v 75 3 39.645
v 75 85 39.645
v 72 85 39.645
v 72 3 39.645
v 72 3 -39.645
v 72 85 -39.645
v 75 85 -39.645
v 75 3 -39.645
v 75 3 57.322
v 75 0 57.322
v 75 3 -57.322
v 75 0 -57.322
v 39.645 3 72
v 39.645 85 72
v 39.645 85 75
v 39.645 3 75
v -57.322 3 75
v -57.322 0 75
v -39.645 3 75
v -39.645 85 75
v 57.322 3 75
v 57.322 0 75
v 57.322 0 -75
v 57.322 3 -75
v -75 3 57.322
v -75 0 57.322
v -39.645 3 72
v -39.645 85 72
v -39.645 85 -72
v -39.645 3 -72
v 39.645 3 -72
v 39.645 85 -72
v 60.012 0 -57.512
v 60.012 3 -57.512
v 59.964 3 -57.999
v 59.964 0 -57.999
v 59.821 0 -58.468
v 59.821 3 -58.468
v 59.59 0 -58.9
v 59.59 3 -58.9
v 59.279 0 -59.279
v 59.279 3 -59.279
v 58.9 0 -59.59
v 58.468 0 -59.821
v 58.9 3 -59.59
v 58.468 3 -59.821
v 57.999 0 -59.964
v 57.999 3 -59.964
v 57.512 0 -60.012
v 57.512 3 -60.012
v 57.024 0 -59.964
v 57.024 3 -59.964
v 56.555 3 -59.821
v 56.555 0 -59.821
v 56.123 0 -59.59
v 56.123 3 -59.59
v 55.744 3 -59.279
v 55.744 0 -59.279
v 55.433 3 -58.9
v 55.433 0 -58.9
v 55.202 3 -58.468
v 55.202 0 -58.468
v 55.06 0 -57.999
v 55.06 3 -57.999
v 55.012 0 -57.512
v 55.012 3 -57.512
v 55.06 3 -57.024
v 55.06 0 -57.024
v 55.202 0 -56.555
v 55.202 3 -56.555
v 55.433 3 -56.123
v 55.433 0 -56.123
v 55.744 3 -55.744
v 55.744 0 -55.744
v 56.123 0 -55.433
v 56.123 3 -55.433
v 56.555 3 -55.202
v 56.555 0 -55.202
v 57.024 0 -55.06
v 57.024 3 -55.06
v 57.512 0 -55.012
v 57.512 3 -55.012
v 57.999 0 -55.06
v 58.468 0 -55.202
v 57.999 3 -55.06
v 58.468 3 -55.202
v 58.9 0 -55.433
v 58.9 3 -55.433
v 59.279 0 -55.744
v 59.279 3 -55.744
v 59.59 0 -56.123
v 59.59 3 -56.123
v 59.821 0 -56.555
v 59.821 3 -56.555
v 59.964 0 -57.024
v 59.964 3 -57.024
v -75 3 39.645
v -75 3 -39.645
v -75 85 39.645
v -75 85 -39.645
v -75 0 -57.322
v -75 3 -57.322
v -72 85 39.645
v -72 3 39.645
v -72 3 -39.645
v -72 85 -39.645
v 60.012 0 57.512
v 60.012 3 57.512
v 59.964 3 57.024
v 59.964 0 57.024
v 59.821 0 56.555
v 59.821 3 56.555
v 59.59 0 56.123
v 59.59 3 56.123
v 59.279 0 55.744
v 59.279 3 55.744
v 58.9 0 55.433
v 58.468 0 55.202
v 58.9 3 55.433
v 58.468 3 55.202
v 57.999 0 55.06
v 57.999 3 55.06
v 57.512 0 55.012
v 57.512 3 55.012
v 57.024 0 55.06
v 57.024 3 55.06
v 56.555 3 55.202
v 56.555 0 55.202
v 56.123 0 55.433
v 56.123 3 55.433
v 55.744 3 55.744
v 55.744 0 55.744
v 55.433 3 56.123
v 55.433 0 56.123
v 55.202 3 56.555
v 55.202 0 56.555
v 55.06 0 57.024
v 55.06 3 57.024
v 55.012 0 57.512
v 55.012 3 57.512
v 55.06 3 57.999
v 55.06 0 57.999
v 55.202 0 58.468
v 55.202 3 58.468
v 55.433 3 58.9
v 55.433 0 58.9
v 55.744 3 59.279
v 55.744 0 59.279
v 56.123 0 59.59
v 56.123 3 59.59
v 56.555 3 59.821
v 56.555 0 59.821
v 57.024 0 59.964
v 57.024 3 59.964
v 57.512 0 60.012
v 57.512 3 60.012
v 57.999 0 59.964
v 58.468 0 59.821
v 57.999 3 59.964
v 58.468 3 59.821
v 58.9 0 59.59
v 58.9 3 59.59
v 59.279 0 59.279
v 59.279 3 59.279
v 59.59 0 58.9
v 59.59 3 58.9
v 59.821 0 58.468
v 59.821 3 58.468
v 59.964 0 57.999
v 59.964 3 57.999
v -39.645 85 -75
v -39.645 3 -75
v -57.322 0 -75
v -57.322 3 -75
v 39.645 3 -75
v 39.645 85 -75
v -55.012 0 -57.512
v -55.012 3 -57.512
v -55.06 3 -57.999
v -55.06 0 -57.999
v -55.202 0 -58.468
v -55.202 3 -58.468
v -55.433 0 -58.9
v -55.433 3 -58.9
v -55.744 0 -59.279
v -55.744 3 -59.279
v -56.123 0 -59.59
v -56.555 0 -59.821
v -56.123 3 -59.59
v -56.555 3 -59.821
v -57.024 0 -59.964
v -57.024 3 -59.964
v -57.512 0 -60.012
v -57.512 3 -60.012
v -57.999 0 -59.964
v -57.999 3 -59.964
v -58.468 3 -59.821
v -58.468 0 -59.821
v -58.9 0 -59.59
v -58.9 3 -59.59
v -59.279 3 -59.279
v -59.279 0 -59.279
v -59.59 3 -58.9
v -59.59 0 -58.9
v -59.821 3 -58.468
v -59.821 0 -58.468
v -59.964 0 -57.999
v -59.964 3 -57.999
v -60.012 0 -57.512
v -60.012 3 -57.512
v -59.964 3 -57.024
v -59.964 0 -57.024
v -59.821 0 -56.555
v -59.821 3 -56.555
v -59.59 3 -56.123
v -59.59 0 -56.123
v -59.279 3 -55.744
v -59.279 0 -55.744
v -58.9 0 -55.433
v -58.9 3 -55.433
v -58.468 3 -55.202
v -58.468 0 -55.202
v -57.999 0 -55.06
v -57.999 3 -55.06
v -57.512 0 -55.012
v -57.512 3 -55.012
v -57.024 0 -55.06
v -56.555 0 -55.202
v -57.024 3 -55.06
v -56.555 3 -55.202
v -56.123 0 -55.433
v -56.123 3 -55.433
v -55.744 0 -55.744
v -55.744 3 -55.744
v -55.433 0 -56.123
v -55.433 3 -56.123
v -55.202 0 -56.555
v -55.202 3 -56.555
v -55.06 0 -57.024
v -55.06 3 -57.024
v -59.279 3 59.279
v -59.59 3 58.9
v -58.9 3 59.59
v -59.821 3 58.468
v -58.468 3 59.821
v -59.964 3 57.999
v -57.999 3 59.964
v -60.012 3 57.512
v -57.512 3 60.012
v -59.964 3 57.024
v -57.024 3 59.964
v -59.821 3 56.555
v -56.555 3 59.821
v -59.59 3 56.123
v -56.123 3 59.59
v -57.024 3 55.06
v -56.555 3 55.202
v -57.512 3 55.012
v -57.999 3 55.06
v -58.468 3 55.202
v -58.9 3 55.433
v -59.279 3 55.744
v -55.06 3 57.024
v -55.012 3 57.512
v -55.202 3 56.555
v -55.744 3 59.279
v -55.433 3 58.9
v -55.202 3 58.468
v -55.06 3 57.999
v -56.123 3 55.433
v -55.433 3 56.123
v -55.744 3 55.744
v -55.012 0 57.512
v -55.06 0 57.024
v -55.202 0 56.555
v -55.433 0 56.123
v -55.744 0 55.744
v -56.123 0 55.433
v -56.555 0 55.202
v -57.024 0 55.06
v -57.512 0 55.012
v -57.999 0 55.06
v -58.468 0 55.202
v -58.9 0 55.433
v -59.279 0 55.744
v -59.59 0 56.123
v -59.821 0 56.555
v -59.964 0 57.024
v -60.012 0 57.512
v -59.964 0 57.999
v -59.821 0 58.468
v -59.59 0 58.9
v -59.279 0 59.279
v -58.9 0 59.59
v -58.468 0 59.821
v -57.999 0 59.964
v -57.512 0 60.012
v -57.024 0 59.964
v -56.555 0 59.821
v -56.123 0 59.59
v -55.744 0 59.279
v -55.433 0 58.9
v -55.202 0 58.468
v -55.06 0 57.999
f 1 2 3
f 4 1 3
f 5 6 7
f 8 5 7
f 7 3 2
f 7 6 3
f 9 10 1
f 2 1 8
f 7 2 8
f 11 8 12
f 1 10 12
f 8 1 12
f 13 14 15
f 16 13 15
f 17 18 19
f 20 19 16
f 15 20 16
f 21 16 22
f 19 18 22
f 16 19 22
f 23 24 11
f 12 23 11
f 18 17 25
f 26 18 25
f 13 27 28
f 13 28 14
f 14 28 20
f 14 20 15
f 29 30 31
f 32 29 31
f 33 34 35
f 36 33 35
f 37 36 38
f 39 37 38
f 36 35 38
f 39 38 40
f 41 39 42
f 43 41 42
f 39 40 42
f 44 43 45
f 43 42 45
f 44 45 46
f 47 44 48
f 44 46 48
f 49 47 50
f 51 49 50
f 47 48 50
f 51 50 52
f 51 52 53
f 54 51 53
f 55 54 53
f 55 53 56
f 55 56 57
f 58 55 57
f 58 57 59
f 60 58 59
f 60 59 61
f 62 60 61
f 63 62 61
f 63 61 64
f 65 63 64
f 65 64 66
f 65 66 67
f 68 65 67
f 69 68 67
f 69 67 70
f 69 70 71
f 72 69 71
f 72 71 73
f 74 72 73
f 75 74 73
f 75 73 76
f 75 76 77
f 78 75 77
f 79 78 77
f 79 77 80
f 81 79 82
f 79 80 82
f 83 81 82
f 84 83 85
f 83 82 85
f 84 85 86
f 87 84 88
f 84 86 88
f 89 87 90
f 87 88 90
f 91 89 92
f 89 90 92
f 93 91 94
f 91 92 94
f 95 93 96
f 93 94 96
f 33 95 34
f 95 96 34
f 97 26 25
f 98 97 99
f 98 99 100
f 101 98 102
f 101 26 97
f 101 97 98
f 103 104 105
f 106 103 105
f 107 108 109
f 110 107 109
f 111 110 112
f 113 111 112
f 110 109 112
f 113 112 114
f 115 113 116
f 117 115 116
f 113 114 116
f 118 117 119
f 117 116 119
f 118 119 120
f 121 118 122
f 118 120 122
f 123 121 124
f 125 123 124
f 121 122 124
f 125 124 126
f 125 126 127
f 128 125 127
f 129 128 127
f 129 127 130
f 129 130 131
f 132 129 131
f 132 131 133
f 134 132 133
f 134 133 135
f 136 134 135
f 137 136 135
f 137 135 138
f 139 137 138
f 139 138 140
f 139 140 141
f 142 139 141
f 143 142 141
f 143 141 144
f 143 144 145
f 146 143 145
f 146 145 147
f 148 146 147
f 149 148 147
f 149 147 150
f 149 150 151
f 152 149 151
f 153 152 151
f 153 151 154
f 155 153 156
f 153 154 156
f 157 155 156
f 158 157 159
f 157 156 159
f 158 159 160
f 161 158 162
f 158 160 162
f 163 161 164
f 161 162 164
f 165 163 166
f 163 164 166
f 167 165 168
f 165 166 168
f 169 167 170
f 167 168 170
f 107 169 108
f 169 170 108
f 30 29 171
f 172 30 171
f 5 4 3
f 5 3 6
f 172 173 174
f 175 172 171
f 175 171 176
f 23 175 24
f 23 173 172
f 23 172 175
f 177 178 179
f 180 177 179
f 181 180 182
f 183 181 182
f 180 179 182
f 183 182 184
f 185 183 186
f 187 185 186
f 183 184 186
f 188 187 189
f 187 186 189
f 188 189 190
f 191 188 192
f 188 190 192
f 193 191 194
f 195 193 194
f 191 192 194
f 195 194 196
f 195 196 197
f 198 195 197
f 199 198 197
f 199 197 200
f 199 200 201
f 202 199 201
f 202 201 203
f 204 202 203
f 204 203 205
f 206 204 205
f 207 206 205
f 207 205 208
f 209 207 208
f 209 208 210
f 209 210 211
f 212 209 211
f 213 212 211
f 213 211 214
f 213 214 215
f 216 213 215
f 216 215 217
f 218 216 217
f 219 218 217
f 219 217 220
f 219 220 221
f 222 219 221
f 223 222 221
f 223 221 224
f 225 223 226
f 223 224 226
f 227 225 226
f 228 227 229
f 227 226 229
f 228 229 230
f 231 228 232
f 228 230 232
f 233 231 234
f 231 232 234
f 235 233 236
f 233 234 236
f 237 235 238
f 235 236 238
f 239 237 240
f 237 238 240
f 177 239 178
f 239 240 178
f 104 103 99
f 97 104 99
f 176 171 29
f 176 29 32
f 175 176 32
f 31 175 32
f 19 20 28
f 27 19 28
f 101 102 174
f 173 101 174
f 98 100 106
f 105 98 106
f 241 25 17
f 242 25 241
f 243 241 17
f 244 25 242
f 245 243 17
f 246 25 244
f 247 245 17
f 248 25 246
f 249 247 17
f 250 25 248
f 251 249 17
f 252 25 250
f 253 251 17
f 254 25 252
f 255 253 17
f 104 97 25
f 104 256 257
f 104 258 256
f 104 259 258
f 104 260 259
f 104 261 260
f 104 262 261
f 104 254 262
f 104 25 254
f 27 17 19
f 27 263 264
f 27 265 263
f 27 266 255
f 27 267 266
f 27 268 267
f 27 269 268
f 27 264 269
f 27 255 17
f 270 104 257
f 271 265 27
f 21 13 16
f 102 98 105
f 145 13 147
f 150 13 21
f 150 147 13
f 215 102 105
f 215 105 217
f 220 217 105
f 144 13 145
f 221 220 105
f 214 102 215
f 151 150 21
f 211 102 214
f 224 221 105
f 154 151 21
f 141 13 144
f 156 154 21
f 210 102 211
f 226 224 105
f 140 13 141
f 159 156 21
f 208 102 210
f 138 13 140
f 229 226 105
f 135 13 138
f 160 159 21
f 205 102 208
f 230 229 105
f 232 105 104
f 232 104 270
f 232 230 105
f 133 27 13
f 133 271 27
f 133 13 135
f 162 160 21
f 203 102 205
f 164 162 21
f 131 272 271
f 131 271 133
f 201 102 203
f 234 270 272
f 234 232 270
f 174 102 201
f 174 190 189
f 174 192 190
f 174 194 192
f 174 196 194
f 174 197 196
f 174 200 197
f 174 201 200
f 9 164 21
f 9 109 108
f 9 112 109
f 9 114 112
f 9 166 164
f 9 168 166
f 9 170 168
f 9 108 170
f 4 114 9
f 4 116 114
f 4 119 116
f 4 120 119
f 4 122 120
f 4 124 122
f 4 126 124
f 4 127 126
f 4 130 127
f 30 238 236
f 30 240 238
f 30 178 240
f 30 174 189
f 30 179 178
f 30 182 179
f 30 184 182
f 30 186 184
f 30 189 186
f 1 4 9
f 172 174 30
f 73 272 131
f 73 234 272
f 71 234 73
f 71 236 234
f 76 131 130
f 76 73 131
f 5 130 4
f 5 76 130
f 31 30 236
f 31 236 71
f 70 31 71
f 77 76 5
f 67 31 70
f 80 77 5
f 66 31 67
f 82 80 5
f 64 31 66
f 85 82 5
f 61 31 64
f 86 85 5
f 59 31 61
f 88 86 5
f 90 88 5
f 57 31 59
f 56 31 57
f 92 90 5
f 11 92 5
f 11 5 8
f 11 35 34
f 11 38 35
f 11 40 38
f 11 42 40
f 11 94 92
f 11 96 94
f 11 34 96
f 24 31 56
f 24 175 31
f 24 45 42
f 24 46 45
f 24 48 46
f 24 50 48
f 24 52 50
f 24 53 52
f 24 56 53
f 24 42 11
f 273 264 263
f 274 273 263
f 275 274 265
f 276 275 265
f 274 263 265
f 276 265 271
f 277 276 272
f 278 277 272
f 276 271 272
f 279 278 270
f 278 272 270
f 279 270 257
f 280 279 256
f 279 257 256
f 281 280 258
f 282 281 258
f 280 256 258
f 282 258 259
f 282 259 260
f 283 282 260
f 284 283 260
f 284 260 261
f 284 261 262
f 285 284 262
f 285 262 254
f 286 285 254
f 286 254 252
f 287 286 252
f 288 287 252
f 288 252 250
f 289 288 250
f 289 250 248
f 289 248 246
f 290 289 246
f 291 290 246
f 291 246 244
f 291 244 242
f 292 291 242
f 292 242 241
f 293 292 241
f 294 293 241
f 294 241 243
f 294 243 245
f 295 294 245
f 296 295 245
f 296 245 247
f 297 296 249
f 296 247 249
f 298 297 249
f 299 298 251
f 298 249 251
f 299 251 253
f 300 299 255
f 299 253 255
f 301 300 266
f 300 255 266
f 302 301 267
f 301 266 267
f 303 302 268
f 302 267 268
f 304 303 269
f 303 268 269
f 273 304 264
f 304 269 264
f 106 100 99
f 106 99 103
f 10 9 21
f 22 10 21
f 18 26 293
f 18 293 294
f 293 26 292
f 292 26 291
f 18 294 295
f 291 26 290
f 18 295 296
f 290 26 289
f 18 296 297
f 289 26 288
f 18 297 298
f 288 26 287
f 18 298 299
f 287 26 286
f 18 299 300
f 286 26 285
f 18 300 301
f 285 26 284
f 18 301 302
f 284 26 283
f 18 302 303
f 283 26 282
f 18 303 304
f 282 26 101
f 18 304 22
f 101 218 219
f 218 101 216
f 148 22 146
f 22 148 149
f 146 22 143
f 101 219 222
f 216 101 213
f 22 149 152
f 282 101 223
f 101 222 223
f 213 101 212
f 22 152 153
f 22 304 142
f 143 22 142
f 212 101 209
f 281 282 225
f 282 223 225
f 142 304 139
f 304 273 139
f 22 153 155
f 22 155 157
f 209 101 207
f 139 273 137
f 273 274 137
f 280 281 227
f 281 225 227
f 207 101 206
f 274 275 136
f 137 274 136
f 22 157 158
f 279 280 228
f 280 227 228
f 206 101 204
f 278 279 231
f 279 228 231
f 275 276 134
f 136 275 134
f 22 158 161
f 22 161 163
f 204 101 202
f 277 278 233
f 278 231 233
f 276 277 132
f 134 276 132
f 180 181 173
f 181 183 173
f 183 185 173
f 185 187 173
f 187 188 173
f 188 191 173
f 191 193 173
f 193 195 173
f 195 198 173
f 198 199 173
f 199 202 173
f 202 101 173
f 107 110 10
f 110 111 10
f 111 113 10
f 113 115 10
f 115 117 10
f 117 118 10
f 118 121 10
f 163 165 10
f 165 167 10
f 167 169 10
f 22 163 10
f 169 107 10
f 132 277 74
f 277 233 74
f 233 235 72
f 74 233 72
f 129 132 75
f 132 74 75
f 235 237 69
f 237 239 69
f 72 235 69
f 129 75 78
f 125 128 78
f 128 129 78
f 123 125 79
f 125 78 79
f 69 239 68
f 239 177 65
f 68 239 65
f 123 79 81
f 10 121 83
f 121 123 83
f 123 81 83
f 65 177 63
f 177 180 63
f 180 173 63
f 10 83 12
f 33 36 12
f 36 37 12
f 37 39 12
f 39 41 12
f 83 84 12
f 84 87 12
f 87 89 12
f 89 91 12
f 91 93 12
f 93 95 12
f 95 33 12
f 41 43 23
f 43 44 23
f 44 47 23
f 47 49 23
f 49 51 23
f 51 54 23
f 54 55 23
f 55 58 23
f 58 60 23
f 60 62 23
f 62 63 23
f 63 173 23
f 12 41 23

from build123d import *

# Parameters (mm, degrees)
SKETCH2_W           = 150
SKETCH2_H           = 150
BOSS_EXTRUDE1_DEPTH = 85
SHELL1_T            = -3
CUT_EXTRUDE1_DEPTH  = 82
CUT_EXTRUDE2_DEPTH  = 4
SKETCH5_R           = 2.5
CUT_EXTRUDE3_DEPTH  = 4


with BuildPart() as part:
    # Sketch2 → Boss-Extrude1 (new body)
    with BuildSketch(Plane(origin=(0, 0, 0), x_dir=(1, 0, 0), z_dir=(0, 1, 0))):
        Rectangle(SKETCH2_W, SKETCH2_H)
    extrude(amount=BOSS_EXTRUDE1_DEPTH)

    # Shell1
    shell1_openings = [part.faces().sort_by_distance(p)[0] for p in [
        (0, 85, 0),
    ]]
    offset(amount=SHELL1_T, openings=shell1_openings, kind=Kind.INTERSECTION)

    # Sketch3 → Cut-Extrude1 (cut)
    with BuildSketch(Plane(origin=(0, 85, 0), x_dir=(1, 0, 0), z_dir=(0, 1, 0))):
        Polygon((39.644660941, -75), (75, -75), (75, -39.644660941), (72, -39.644660941), (72, -42.644660941), (72, -72), (39.644660941, -72), align=None)
        Polygon((-39.644660941, -72), (-42.644660941, -72), (-72, -72), (-72, -39.644660941), (-75, -39.644660941), (-75, -75), (-39.644660941, -75), align=None)
        Polygon((-72, 39.644660941), (-72, 42.644660941), (-72, 72), (-39.644660941, 72), (-39.644660941, 75), (-75, 75), (-75, 39.644660941), align=None)
        Polygon((39.644660941, 72), (42.644660941, 72), (72, 72), (72, 39.644660941), (75, 39.644660941), (75, 75), (39.644660941, 75), align=None)
    extrude(amount=-CUT_EXTRUDE1_DEPTH, mode=Mode.SUBTRACT)

    # Sketch4 → Cut-Extrude2 (cut, through all)
    with BuildSketch(Plane(origin=(0, 3, 0), x_dir=(1, 0, 0), z_dir=(0, 1, 0))):
        Polygon((-75, -57.32233047), (-75, -75), (-57.32233047, -75), align=None)
        Polygon((-75, 57.32233047), (-57.32233047, 75), (-75, 75), align=None)
        Polygon((57.32233047, 75), (75, 57.32233047), (75, 75), align=None)
        Polygon((75, -57.32233047), (57.32233047, -75), (75, -75), align=None)
    extrude(amount=-CUT_EXTRUDE2_DEPTH, mode=Mode.SUBTRACT)

    # Sketch5 → Cut-Extrude3 (cut, through all)
    with BuildSketch(Plane(origin=(0, 3, 0), x_dir=(1, 0, 0), z_dir=(0, 1, 0))):
        with Locations((57.511546526, 57.511546526)):
            Circle(SKETCH5_R)
        with Locations((57.511546526, -57.511546526)):
            Circle(SKETCH5_R)
        with Locations((-57.511546526, -57.511546526)):
            Circle(SKETCH5_R)
        with Locations((-57.511546526, 57.511546526)):
            Circle(SKETCH5_R)
    extrude(amount=-CUT_EXTRUDE3_DEPTH, mode=Mode.SUBTRACT)


solid = part.part
